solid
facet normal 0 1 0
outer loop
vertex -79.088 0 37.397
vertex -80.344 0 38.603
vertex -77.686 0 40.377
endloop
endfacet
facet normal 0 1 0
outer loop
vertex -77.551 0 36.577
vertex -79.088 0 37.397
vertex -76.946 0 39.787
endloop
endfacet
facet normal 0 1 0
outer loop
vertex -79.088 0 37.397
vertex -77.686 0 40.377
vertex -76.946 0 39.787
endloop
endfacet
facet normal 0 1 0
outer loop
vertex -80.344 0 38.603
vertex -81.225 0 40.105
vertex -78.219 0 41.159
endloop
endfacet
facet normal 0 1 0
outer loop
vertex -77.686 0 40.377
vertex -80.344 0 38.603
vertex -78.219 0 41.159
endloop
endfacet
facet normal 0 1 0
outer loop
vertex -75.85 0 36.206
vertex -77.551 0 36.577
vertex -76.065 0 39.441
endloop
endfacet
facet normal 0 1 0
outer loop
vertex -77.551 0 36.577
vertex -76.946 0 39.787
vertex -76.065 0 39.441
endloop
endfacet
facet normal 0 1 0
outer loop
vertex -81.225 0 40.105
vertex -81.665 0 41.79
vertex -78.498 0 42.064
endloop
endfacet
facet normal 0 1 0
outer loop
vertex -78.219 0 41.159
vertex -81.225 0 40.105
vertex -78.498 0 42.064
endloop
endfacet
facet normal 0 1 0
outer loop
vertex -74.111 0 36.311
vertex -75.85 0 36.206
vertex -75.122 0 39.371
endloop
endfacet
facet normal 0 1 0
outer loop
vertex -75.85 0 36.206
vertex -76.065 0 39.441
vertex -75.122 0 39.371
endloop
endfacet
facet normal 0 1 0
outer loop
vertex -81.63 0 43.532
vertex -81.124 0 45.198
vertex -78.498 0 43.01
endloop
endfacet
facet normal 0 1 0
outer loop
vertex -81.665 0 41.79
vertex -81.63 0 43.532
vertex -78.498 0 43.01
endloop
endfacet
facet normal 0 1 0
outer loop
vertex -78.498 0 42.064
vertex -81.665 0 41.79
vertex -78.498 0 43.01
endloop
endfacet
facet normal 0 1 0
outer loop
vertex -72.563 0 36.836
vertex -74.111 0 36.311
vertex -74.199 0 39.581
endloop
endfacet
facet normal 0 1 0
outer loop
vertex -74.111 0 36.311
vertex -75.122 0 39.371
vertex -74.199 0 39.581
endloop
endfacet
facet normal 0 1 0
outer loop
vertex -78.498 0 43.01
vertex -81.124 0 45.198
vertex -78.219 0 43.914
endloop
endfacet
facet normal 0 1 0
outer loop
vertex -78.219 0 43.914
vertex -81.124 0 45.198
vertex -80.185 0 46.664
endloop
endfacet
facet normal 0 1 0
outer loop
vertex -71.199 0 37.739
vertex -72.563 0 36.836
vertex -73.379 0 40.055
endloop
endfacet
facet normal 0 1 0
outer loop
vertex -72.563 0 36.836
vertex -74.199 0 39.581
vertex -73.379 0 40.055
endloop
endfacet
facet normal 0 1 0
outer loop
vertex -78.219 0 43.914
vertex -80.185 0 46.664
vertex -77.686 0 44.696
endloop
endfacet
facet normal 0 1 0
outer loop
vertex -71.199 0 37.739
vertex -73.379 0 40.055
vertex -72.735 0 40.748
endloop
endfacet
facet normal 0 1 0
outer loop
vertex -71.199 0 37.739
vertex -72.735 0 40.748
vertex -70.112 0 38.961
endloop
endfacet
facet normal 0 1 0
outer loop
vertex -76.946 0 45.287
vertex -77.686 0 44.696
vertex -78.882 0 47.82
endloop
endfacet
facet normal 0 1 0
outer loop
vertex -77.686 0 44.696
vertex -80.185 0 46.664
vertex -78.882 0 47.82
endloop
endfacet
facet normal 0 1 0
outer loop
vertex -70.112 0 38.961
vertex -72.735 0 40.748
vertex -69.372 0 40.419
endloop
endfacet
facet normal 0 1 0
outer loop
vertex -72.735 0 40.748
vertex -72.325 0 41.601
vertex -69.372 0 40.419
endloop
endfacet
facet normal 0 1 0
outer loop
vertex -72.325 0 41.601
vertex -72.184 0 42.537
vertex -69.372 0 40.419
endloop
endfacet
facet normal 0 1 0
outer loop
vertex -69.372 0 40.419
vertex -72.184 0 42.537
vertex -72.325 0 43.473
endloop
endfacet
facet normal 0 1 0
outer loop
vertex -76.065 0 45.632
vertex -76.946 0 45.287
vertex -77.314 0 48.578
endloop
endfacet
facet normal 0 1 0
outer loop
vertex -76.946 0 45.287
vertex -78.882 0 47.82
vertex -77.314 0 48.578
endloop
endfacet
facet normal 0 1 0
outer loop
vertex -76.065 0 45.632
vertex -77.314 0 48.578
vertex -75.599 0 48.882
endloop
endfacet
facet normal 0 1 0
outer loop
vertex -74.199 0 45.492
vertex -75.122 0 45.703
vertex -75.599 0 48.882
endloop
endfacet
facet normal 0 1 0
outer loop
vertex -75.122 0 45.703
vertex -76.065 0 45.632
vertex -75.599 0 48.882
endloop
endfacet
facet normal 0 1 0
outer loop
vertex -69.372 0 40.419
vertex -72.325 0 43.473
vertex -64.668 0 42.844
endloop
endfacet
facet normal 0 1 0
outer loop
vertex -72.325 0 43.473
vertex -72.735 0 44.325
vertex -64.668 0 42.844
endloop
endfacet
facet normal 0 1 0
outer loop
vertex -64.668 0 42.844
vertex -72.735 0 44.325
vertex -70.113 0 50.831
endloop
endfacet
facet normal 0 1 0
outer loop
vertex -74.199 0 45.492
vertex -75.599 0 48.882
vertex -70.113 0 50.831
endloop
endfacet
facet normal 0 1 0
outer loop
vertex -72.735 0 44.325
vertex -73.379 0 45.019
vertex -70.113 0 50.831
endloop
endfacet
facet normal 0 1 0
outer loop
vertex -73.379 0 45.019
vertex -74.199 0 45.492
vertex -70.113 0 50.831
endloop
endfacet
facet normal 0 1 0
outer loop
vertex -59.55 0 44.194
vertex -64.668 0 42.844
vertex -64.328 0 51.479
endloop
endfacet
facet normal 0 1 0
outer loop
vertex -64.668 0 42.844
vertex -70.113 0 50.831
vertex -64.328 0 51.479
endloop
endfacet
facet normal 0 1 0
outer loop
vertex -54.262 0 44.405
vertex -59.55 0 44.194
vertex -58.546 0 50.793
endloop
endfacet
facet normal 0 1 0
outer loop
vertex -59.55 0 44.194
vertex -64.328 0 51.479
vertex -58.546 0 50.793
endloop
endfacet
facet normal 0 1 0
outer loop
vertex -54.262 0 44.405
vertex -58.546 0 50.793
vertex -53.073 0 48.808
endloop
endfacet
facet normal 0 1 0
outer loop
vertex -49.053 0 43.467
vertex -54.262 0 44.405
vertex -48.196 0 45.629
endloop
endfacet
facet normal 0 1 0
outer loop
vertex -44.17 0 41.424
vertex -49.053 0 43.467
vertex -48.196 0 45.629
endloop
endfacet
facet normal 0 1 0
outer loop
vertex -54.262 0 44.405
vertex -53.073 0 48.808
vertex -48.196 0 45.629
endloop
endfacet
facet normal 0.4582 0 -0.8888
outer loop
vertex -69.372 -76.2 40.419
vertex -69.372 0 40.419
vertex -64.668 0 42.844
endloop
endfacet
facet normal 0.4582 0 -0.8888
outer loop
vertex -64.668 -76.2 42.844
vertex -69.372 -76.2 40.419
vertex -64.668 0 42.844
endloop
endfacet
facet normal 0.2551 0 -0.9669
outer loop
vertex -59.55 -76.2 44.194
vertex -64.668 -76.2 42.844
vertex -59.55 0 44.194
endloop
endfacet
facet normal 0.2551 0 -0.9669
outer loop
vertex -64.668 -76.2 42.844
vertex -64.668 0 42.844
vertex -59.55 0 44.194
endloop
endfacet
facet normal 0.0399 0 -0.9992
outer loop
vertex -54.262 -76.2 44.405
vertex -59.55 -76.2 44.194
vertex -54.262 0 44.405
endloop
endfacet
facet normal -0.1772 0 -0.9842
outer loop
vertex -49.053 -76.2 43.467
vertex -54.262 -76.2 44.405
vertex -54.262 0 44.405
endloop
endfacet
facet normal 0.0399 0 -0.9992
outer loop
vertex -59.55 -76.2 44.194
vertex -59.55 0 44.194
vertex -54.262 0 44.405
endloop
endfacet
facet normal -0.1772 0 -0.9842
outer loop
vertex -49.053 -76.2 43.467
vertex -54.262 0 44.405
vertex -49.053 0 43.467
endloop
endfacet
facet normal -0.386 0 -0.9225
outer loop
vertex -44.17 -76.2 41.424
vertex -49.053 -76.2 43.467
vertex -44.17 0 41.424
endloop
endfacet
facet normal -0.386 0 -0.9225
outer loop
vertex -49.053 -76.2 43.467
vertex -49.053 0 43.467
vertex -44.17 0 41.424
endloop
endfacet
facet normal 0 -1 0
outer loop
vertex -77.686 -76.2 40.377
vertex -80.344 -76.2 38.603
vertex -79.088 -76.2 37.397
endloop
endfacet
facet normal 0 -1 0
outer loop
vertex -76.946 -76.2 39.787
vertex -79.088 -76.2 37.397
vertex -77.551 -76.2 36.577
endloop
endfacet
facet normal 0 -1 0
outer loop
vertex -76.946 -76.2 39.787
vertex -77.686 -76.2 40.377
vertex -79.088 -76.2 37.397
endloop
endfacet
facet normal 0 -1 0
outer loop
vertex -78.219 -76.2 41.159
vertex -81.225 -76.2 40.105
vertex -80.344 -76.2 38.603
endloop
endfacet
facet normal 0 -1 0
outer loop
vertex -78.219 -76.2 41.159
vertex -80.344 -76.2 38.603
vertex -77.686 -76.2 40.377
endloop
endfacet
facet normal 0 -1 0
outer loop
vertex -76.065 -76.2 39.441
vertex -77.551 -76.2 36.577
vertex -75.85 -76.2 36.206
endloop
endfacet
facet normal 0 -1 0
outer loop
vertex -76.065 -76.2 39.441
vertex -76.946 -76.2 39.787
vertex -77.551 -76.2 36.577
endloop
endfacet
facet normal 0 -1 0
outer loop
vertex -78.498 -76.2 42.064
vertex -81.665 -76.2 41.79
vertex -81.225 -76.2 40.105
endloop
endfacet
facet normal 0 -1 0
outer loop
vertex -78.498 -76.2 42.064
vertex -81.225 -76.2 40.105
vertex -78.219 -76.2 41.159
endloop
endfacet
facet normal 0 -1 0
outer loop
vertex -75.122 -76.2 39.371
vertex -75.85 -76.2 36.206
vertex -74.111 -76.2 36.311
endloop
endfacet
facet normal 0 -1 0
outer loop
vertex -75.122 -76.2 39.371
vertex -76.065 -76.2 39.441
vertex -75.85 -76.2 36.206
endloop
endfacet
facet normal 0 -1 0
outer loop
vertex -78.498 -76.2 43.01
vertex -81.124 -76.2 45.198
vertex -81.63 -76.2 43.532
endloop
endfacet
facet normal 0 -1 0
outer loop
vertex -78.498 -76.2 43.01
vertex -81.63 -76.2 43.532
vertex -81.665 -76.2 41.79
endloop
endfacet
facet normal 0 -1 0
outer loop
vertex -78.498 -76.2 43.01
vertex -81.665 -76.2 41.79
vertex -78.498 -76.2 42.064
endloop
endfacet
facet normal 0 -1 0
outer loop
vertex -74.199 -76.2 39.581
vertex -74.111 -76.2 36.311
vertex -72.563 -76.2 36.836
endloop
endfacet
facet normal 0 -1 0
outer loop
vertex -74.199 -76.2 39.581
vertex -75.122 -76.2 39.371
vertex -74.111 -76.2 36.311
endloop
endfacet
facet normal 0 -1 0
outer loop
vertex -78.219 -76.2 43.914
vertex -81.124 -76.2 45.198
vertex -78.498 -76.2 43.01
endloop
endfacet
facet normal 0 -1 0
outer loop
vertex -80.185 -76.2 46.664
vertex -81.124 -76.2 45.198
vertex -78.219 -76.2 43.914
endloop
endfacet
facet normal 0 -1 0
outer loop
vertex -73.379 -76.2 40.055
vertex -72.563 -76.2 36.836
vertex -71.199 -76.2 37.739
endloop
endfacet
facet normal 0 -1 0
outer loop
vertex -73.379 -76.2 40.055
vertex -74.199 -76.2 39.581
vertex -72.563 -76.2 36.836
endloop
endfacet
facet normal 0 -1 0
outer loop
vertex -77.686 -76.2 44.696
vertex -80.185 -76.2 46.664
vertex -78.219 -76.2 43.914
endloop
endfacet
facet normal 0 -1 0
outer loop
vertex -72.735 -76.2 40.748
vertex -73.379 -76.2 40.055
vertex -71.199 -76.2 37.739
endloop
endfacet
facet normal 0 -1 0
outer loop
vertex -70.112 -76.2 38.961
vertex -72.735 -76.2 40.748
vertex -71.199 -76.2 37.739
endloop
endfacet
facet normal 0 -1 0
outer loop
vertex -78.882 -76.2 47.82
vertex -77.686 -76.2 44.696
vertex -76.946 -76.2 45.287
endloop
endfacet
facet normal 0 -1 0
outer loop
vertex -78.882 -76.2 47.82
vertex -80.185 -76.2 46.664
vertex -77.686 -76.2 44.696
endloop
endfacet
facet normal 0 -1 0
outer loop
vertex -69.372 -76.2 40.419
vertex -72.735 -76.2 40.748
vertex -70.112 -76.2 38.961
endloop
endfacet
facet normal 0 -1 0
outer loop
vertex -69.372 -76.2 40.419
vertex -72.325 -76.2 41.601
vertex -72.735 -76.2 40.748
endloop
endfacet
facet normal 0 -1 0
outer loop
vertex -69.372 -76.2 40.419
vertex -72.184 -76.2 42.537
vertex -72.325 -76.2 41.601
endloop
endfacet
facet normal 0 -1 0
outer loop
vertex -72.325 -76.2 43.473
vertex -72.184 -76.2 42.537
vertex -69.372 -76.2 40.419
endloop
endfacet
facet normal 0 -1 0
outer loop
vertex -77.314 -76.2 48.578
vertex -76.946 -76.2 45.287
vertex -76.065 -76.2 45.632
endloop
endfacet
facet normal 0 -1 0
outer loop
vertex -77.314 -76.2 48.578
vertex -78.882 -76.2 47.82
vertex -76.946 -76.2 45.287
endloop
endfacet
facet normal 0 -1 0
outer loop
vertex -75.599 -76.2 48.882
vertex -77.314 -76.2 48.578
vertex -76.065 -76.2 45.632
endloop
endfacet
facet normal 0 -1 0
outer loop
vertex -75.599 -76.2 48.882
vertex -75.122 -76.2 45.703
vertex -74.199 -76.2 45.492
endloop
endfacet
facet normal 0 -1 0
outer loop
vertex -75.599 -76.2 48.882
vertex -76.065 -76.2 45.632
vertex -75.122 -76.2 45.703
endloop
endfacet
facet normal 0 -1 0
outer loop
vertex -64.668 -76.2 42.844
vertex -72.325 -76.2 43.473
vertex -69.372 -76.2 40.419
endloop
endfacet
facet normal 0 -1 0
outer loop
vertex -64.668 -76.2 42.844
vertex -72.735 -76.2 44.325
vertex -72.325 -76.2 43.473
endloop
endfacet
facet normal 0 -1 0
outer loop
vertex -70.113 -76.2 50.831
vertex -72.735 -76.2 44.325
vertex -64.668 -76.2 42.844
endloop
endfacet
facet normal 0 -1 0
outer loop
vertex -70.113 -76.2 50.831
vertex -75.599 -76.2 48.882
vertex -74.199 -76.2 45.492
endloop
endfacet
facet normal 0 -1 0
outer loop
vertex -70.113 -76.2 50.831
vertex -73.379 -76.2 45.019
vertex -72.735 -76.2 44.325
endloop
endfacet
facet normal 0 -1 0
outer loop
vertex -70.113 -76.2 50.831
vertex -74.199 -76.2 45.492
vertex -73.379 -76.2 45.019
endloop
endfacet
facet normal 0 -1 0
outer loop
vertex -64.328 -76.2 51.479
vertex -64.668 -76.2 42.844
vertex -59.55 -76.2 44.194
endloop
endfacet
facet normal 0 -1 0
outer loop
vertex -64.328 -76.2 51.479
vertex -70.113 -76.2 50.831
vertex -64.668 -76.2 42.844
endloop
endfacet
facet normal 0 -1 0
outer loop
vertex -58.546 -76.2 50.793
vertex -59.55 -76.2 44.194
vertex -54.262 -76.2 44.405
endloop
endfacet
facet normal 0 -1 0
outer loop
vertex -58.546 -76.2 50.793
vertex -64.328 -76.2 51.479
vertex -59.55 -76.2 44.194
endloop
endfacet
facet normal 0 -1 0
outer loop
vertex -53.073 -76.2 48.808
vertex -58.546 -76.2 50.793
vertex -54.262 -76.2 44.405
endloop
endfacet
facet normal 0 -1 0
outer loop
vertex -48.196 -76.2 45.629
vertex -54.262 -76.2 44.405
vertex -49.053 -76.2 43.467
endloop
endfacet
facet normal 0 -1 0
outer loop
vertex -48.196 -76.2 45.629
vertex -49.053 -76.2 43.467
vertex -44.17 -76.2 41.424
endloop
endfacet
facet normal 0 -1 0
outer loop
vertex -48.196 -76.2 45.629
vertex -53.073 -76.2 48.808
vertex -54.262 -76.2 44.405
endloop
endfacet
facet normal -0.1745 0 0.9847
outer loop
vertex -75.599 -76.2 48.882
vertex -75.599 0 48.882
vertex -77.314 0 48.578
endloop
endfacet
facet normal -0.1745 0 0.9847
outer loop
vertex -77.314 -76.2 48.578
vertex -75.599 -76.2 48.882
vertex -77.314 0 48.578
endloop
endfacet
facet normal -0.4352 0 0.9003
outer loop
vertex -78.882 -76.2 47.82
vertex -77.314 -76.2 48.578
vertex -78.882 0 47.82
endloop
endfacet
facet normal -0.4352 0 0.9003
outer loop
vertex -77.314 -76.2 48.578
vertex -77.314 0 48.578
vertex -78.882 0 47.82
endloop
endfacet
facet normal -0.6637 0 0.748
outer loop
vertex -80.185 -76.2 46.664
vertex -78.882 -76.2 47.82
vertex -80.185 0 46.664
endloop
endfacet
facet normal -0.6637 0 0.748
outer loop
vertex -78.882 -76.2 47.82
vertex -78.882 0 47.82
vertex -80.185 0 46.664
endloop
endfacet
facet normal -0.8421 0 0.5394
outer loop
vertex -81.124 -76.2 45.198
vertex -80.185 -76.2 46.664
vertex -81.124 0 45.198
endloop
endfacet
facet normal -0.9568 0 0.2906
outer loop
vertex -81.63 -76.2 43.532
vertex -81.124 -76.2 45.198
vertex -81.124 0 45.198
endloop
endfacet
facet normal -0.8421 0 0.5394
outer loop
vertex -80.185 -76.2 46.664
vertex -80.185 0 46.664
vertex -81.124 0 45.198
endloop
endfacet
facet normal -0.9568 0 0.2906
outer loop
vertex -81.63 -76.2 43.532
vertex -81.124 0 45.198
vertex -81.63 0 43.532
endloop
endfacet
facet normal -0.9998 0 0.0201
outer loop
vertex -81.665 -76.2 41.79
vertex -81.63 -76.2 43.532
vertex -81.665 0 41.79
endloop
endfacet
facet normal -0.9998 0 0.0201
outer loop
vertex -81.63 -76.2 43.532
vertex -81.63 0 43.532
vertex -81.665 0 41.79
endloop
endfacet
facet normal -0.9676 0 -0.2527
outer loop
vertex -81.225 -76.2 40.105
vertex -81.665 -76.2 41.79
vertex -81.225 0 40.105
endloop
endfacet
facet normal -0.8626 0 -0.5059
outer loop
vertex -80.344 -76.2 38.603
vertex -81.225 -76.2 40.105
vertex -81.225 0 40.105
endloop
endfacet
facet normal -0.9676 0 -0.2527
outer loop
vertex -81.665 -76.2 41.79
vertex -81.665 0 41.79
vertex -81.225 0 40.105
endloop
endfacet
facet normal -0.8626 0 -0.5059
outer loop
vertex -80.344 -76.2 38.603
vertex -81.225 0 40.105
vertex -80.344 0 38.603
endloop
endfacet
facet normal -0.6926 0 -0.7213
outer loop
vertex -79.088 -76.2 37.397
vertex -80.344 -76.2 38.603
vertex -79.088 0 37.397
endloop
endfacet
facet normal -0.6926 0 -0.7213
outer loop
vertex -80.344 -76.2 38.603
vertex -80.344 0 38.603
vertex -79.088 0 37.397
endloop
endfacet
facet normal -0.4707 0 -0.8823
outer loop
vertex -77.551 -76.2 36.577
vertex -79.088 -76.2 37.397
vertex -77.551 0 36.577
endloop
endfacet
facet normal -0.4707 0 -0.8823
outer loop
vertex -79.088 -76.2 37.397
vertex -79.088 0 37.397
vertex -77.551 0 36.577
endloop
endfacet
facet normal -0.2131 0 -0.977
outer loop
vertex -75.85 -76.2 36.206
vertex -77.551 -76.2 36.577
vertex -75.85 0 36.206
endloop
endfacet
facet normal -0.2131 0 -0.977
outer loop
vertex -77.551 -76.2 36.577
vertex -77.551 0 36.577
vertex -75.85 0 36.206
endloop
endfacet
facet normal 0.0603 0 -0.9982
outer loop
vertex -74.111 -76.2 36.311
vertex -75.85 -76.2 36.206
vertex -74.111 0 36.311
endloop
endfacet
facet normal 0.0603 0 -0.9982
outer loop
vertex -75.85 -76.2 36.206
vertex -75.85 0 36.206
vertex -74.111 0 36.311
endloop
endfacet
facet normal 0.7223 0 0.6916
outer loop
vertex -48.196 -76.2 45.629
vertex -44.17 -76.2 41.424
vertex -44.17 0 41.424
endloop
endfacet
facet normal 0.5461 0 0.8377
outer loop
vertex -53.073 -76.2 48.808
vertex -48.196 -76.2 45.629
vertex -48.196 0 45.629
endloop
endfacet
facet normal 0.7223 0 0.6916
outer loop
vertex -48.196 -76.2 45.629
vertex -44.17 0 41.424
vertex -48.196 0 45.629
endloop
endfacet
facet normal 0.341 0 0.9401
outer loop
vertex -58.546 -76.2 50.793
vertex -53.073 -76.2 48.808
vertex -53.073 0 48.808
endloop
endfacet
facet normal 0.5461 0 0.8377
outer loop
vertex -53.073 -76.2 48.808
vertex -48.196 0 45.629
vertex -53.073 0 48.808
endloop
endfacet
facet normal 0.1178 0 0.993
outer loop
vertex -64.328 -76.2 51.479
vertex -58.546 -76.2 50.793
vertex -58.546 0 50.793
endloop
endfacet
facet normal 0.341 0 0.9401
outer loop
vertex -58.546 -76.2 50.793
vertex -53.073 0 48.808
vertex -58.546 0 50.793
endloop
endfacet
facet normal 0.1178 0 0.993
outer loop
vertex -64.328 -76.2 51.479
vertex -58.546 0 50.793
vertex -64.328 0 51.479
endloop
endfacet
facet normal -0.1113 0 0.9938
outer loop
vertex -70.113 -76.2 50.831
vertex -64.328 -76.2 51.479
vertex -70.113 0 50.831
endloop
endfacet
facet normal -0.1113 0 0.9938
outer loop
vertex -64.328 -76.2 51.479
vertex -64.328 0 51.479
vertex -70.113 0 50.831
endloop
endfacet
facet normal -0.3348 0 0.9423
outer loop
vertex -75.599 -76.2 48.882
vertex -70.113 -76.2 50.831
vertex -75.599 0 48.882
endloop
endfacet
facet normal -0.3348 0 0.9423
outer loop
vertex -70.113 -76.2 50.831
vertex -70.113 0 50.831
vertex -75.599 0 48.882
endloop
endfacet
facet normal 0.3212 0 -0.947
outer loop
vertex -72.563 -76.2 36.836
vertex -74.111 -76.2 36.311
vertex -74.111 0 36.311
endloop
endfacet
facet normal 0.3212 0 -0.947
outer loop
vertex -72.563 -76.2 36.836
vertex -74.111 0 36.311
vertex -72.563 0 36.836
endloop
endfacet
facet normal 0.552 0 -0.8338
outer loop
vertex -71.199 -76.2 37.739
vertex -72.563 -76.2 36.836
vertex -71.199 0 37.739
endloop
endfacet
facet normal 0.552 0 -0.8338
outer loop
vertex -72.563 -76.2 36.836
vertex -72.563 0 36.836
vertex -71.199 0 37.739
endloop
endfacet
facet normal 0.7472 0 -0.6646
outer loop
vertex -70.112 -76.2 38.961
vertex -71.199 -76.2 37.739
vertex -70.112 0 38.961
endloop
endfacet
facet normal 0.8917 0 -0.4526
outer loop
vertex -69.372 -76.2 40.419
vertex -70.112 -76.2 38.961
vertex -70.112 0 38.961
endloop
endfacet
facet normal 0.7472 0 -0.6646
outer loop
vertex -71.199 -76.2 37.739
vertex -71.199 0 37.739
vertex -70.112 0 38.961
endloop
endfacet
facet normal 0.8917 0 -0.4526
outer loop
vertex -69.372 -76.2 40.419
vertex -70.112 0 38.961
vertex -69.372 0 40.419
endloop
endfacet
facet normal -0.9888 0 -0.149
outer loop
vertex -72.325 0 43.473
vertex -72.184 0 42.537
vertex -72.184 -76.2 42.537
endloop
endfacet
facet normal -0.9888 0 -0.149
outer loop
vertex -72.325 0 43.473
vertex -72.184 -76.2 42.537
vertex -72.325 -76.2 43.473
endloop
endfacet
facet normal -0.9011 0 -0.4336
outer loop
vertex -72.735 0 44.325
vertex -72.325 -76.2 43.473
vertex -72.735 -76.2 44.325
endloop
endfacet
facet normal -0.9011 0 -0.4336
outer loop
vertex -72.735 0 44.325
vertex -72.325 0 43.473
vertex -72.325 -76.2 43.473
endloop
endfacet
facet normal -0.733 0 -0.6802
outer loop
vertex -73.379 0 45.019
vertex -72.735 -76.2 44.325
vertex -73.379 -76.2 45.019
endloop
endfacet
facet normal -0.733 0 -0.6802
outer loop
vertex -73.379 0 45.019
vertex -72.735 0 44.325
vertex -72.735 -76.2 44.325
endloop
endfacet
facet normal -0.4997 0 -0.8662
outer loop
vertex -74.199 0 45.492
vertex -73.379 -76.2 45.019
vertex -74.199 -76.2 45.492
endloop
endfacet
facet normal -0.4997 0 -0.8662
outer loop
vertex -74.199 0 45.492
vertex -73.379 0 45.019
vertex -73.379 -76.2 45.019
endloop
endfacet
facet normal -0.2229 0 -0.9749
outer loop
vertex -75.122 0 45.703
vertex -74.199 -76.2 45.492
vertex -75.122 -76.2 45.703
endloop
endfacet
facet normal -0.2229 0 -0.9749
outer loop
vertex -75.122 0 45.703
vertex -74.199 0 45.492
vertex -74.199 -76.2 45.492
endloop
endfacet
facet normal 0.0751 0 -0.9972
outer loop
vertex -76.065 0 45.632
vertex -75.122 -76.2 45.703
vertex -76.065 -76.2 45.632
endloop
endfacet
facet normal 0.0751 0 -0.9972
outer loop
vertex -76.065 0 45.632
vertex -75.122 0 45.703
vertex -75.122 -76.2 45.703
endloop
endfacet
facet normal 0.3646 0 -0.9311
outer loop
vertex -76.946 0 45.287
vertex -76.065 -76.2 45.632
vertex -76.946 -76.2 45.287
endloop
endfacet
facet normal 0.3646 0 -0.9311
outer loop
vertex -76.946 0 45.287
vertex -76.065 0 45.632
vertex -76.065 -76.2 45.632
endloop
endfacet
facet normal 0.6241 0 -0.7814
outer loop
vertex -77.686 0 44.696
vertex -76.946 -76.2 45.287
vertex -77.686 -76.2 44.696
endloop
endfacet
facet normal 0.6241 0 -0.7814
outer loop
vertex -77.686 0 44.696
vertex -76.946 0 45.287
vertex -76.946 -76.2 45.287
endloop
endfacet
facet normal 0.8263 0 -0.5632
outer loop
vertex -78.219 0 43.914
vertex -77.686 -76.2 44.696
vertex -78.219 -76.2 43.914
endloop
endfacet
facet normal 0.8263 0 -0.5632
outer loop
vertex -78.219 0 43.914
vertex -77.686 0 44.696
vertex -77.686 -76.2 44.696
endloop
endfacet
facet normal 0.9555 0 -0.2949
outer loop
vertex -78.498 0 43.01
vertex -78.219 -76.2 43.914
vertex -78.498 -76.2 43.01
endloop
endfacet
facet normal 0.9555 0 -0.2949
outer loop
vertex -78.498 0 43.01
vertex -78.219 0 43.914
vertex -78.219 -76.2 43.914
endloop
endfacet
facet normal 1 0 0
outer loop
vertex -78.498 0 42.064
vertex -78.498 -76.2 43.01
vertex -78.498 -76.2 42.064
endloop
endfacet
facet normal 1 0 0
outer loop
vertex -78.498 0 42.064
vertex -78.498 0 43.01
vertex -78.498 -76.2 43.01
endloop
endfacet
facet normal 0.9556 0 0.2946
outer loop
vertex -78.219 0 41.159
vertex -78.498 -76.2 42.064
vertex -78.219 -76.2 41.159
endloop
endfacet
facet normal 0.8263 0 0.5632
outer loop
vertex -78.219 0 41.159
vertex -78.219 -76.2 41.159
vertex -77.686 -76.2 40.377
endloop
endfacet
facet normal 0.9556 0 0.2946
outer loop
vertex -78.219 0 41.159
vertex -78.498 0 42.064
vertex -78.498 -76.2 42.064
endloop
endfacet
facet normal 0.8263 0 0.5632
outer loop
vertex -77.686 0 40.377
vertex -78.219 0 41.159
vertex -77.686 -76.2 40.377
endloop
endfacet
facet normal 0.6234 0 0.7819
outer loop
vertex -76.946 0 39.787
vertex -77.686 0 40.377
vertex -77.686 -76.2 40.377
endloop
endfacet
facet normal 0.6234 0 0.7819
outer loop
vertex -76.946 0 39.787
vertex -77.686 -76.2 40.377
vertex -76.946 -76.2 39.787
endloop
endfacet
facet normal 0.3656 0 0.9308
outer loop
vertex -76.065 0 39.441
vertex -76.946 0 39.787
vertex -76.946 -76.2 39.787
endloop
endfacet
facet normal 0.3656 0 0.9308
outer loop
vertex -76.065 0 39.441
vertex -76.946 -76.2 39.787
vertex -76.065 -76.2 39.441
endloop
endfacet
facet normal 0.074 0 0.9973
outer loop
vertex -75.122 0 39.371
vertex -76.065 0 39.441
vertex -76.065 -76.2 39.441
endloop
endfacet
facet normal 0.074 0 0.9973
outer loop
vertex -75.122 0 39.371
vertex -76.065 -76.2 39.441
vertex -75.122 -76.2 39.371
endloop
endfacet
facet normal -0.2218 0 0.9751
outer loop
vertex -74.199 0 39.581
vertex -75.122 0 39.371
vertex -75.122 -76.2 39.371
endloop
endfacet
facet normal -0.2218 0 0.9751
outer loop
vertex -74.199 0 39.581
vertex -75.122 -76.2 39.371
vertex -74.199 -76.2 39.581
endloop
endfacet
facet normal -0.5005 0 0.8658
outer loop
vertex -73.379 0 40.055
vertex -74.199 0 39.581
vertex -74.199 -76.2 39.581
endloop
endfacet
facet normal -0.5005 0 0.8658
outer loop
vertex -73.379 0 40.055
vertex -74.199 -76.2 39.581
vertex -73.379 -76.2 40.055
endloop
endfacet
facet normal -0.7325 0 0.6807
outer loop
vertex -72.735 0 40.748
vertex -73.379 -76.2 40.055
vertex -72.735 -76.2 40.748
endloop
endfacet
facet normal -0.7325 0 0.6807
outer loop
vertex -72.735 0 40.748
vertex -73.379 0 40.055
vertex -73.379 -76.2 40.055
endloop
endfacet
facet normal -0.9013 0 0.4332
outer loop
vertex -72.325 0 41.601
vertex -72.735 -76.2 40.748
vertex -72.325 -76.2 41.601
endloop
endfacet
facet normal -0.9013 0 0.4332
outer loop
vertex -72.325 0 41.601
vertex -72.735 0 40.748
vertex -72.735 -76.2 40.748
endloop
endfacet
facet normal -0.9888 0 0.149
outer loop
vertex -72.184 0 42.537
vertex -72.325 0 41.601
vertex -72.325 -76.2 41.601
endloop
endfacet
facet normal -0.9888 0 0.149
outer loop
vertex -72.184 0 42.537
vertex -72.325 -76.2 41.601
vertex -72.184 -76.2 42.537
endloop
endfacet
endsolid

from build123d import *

# Parameters (mm, degrees)
F0_R     = 3.175
F1_DEPTH = 76.2


with BuildPart() as f1:
    # F0 (on Front) → F1 (new body)
    with BuildSketch(Plane.XZ):
        with BuildLine():
            ThreePointArc((-69.372211, 40.419447), (-69.100298, 41.462677), (-69.008781, 42.53687))
            ThreePointArc((-69.008781, 42.53687), (-70.954579, 47.11131), (-75.599492, 48.882306))
            ThreePointArc((-75.599492, 48.882306), (-81.664762, 41.790478), (-74.111471, 36.310577))
            ThreePointArc((-74.111471, 36.310577), (-71.87486, 38.51844), (-69.372211, 40.419447))
        make_face()
        with Locations((-75.358781, 42.53687)):
            Circle(F0_R, mode=Mode.SUBTRACT)
        with BuildLine():
            ThreePointArc((-75.599492, 48.882306), (-70.954579, 47.11131), (-69.008781, 42.53687))
            ThreePointArc((-69.008781, 42.53687), (-69.100298, 41.462677), (-69.372211, 40.419447))
            ThreePointArc((-69.372211, 40.419447), (-56.911602, 44.443784), (-44.170318, 41.423559))
            ThreePointArc((-44.170318, 41.423559), (-58.546496, 50.792631), (-75.599492, 48.882306))
        make_face()
        with BuildLine():
            ThreePointArc((-74.111471, 36.310577), (-71.199098, 37.739001), (-69.372211, 40.419447))
            ThreePointArc((-69.372211, 40.419447), (-71.87486, 38.51844), (-74.111471, 36.310577))
        make_face()
    extrude(amount=F1_DEPTH)


solid = f1.part
